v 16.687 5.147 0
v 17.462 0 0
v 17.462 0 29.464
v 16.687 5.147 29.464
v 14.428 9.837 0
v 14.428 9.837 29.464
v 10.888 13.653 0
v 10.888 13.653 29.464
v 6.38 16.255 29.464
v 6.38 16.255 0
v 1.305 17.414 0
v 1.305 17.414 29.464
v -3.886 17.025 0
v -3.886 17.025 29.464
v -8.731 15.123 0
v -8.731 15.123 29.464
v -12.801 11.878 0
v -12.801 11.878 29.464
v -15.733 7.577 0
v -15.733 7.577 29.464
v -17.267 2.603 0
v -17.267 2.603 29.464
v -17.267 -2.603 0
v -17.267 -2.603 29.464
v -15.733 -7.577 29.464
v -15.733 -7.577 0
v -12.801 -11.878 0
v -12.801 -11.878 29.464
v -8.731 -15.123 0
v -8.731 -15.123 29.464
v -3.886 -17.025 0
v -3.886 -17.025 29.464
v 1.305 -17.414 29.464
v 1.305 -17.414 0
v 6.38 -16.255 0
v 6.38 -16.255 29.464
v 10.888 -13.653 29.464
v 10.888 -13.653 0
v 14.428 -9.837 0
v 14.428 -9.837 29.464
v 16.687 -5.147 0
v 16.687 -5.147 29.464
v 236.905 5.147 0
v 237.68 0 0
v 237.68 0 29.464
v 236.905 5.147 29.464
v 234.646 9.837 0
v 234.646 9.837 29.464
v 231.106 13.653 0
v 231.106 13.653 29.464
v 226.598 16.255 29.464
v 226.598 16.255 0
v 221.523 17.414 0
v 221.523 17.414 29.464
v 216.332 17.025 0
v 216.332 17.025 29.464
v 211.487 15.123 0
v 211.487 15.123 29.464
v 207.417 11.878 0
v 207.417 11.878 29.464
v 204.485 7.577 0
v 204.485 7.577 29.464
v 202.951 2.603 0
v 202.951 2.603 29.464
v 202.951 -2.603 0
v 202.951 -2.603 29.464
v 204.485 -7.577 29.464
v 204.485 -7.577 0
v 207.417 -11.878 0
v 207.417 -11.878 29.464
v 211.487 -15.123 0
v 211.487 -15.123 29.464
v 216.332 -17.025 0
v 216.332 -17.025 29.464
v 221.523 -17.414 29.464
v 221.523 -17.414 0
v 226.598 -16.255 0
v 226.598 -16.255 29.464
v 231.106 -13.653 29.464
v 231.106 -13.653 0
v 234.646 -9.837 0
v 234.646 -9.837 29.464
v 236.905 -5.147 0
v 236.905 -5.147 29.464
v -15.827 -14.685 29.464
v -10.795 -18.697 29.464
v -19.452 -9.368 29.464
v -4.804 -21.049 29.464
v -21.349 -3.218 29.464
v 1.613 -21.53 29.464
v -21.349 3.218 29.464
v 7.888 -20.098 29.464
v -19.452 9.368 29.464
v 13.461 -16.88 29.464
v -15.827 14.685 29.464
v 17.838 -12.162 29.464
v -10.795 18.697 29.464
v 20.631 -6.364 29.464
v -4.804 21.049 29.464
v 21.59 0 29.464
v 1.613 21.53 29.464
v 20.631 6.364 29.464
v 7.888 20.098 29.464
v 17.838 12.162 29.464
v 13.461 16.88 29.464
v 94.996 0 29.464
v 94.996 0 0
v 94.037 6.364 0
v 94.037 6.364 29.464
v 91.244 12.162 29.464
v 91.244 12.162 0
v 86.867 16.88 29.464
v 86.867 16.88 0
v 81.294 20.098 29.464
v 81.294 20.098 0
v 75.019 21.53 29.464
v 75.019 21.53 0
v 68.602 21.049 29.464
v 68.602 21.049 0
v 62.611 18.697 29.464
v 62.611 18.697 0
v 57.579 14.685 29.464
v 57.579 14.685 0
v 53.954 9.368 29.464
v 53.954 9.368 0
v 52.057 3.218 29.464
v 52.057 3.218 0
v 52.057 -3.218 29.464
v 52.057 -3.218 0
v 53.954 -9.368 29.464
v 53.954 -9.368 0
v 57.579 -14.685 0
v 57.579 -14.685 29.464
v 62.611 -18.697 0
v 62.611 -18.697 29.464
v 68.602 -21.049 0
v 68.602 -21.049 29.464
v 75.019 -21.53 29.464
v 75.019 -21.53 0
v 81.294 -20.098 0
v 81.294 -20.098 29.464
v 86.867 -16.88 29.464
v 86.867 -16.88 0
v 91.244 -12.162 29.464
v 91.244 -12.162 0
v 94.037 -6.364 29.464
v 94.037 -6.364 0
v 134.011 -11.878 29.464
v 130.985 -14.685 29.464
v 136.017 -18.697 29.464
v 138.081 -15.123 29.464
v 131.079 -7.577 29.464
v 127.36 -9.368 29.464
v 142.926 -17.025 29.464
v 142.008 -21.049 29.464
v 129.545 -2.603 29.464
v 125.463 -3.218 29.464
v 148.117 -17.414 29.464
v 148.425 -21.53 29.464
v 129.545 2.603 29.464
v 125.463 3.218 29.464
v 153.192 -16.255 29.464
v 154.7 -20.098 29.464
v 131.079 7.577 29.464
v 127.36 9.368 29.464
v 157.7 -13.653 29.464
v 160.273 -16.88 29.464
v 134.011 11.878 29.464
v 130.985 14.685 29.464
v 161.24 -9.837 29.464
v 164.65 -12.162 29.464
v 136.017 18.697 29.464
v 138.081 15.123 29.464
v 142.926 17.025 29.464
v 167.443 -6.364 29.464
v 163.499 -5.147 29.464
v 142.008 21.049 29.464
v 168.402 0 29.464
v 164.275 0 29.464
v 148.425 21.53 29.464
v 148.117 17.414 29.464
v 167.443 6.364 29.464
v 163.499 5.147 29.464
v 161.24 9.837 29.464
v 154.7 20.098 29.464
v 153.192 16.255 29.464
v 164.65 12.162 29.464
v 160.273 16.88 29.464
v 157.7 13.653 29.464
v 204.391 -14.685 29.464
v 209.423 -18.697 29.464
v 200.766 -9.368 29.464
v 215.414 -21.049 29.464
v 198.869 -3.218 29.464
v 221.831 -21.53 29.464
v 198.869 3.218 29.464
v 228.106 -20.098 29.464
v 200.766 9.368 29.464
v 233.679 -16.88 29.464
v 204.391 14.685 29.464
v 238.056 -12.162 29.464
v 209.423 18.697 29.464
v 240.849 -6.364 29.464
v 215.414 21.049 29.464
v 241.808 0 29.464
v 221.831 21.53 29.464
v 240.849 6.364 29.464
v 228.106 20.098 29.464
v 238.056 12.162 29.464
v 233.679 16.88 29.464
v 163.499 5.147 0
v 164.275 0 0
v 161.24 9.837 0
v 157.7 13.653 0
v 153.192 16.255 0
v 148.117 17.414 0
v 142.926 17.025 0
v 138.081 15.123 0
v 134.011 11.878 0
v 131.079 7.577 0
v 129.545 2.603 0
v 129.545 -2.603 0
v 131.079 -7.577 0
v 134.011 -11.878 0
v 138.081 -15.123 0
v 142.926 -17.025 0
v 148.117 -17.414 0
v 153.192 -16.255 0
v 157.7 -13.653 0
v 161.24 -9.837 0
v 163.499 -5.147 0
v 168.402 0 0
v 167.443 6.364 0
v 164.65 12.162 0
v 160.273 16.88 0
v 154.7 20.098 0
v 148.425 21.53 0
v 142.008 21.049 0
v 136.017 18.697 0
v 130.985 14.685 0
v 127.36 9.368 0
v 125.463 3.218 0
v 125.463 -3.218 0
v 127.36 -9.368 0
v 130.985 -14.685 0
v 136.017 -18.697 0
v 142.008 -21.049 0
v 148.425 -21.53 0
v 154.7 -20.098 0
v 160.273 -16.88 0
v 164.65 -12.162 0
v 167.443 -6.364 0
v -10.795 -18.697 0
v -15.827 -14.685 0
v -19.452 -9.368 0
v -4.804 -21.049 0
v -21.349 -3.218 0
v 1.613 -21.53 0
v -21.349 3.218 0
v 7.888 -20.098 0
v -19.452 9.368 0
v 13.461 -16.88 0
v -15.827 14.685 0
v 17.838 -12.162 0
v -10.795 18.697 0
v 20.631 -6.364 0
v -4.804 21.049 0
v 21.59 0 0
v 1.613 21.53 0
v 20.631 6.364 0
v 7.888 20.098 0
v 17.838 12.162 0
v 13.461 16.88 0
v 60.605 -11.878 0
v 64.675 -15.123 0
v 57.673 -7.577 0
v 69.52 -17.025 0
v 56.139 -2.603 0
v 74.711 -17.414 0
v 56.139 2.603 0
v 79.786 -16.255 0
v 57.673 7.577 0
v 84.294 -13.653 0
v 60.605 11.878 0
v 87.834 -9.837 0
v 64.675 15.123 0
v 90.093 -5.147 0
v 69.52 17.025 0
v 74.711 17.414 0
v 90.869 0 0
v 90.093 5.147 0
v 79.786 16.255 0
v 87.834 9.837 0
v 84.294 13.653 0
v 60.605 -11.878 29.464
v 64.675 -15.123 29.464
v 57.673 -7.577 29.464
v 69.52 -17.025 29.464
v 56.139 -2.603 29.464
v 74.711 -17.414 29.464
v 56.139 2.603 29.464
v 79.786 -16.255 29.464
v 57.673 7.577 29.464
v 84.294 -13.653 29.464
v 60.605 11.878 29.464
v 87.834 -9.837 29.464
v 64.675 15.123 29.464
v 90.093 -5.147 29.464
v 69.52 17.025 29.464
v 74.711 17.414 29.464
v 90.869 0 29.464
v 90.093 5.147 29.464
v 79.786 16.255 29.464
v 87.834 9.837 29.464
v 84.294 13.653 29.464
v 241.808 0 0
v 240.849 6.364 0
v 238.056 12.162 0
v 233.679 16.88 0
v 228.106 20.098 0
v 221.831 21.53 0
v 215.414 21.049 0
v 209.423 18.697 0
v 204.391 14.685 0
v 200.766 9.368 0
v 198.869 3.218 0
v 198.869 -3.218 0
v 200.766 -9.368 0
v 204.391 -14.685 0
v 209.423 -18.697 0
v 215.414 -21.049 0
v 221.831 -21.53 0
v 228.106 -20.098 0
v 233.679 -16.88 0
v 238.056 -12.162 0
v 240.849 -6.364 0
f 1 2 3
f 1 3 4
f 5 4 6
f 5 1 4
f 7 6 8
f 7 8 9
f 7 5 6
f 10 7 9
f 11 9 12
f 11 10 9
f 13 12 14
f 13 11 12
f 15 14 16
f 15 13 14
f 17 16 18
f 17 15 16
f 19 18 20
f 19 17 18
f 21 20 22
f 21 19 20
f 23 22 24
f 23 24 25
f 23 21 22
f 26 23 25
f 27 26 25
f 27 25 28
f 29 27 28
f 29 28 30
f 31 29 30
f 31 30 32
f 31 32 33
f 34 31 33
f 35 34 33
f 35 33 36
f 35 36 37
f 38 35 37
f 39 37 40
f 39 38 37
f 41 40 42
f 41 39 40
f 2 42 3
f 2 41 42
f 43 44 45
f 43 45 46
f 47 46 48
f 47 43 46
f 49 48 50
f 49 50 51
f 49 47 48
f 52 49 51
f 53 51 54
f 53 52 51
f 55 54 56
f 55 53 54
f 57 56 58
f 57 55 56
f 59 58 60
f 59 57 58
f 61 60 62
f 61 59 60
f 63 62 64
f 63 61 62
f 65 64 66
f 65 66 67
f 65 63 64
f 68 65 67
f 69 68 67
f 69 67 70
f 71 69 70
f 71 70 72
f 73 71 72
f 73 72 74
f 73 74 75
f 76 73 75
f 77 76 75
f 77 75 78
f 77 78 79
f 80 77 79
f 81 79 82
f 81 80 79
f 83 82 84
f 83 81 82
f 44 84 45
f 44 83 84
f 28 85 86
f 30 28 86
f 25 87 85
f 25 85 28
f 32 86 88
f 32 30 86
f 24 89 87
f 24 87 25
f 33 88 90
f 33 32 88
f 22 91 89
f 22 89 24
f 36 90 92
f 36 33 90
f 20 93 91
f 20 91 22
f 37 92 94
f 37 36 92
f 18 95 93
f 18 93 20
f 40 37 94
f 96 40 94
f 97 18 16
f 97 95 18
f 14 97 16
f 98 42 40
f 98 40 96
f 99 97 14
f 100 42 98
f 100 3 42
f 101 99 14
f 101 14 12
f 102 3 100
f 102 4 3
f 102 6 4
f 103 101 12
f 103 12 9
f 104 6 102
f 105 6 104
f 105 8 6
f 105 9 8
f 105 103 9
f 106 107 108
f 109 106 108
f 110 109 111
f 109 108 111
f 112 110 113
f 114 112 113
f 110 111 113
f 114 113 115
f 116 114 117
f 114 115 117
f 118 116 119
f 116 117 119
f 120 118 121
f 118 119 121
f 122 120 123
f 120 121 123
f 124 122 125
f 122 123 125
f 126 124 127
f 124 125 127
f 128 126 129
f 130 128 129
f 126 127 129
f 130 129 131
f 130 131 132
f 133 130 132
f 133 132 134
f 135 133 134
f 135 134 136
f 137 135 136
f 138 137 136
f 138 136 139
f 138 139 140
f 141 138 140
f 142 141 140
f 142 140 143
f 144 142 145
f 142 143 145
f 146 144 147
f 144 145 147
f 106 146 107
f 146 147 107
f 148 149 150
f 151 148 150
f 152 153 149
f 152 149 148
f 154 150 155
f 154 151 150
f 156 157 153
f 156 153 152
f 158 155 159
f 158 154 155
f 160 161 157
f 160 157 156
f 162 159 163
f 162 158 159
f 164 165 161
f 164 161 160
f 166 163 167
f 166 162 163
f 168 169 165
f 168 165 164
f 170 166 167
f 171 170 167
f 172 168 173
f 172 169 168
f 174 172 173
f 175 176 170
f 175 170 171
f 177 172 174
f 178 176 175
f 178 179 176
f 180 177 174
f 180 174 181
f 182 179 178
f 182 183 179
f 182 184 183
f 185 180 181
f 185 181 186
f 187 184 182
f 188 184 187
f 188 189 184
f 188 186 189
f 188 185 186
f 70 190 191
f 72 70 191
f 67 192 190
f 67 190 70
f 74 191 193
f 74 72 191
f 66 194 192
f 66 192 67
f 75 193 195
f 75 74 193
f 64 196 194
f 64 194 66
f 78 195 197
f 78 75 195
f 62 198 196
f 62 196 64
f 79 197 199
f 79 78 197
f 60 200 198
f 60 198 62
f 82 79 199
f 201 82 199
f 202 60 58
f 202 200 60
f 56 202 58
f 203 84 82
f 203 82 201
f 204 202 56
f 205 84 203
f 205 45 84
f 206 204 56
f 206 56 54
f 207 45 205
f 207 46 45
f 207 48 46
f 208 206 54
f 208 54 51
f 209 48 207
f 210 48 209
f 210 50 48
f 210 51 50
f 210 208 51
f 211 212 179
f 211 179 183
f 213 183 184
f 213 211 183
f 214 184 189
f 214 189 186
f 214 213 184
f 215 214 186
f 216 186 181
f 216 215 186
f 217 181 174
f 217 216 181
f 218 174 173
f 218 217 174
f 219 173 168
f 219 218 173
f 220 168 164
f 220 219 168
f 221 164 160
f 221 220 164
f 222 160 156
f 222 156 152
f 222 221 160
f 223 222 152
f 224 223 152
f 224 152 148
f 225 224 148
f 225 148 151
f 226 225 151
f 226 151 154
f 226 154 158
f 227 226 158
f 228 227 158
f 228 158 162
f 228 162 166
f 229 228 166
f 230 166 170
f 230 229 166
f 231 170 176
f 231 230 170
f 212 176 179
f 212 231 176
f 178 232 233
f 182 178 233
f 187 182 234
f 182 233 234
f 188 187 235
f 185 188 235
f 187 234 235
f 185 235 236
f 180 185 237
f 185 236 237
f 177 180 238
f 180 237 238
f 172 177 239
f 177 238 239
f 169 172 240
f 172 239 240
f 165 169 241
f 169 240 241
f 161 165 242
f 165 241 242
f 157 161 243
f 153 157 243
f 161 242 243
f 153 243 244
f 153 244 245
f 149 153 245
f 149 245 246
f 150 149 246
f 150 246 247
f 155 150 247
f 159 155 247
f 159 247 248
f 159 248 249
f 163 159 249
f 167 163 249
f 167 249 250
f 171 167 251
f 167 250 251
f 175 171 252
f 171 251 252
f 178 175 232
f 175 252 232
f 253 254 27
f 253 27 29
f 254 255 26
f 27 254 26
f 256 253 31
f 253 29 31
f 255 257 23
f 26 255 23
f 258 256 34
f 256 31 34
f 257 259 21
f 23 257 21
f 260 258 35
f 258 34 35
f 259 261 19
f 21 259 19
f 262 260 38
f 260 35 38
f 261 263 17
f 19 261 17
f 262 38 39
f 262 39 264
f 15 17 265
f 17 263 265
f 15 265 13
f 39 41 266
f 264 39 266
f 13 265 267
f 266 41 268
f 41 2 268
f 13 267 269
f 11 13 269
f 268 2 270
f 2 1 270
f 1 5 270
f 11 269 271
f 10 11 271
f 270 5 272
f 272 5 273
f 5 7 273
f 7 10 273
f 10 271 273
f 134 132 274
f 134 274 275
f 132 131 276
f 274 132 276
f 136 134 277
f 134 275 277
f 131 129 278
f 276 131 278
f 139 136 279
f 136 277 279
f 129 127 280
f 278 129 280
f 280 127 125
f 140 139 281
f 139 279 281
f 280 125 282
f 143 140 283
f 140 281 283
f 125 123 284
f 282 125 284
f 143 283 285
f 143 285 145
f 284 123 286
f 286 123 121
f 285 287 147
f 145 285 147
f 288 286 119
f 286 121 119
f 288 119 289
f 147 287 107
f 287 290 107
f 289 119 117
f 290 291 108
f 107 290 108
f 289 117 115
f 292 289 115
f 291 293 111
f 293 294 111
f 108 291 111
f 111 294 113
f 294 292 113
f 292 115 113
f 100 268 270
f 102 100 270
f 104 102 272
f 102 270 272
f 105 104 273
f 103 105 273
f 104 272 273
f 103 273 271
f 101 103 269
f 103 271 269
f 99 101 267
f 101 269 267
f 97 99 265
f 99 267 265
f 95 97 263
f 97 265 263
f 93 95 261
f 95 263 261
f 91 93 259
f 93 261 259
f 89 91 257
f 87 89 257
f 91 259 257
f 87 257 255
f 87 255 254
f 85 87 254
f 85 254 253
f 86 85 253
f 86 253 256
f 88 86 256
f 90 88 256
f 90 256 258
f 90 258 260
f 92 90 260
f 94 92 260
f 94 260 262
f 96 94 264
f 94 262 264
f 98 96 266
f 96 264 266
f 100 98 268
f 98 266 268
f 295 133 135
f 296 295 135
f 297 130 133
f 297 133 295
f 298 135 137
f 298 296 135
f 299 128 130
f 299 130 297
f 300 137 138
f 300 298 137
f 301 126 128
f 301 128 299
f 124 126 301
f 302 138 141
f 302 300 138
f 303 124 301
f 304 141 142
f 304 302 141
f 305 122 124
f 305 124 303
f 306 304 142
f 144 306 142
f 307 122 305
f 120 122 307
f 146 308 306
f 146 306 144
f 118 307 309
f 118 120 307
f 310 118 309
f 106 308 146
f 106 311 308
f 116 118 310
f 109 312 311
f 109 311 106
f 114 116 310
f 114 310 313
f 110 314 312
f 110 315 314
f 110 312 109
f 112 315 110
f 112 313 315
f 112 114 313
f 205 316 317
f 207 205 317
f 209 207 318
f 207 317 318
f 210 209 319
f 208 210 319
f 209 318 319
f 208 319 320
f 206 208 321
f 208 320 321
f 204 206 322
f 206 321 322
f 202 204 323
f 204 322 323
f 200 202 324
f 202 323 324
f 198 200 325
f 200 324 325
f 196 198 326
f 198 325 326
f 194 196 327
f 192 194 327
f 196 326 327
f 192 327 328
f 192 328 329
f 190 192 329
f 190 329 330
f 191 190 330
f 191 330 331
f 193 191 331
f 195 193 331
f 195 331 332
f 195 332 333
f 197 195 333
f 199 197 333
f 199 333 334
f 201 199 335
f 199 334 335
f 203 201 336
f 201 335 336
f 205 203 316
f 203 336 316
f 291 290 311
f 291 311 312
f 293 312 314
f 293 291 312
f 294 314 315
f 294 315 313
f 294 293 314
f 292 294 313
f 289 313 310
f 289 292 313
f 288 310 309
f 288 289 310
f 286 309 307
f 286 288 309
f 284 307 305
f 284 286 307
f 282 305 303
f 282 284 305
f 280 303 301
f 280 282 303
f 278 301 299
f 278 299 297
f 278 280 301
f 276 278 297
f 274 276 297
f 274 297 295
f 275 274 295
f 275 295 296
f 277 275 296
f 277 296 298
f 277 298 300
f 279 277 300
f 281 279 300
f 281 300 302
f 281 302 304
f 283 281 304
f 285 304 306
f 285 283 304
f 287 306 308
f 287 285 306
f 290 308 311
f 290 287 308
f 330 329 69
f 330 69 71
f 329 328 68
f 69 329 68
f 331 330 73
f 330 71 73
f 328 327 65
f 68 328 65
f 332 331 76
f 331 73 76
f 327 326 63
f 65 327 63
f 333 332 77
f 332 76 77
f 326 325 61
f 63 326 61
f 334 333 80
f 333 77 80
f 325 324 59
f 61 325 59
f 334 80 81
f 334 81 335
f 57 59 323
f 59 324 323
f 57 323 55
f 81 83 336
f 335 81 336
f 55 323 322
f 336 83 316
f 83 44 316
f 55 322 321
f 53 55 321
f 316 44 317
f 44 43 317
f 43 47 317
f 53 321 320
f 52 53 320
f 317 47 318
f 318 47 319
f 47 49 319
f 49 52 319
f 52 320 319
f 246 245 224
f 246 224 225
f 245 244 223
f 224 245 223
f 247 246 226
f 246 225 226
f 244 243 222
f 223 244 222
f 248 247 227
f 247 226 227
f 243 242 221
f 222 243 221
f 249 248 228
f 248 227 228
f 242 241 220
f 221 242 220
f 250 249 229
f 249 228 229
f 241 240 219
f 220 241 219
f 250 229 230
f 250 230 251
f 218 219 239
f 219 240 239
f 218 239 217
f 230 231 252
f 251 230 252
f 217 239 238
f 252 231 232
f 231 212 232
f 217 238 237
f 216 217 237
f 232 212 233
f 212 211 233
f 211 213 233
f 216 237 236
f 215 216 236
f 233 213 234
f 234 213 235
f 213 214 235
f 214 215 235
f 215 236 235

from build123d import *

# Parameters (mm, degrees)
SKETCH1_R             = 21.59
SKETCH1_R_2           = 17.4625
BOSS_EXTRUDE4_DEPTH   = 29.464
BOSS_EXTRUDE4_2_DEPTH = 29.464
BOSS_EXTRUDE4_3_DEPTH = 29.464
BOSS_EXTRUDE4_4_DEPTH = 29.464


with BuildPart() as part:
    # Sketch1 → Boss-Extrude4 (new body)
    with BuildSketch(Plane.XY):
        Circle(SKETCH1_R)
        Circle(SKETCH1_R_2, mode=Mode.SUBTRACT)
    extrude(amount=BOSS_EXTRUDE4_DEPTH)


with BuildPart() as body_2:
    # Sketch1 → Boss-Extrude4 2 (new body)
    with BuildSketch(Plane.XY):
        with Locations((73.406, 0)):
            Circle(SKETCH1_R)
        with Locations((73.406, 0)):
            Circle(SKETCH1_R_2, mode=Mode.SUBTRACT)
    extrude(amount=BOSS_EXTRUDE4_2_DEPTH)


with BuildPart() as body_3:
    # Sketch1 → Boss-Extrude4 3 (new body)
    with BuildSketch(Plane.XY):
        with Locations((146.812, 0)):
            Circle(SKETCH1_R)
        with Locations((146.812, 0)):
            Circle(SKETCH1_R_2, mode=Mode.SUBTRACT)
    extrude(amount=BOSS_EXTRUDE4_3_DEPTH)


with BuildPart() as body_4:
    # Sketch1 → Boss-Extrude4 4 (new body)
    with BuildSketch(Plane.XY):
        with Locations((220.218, 0)):
            Circle(SKETCH1_R)
        with Locations((220.218, 0)):
            Circle(SKETCH1_R_2, mode=Mode.SUBTRACT)
    extrude(amount=BOSS_EXTRUDE4_4_DEPTH)


solid = Compound([part.part, body_2.part, body_3.part, body_4.part])
